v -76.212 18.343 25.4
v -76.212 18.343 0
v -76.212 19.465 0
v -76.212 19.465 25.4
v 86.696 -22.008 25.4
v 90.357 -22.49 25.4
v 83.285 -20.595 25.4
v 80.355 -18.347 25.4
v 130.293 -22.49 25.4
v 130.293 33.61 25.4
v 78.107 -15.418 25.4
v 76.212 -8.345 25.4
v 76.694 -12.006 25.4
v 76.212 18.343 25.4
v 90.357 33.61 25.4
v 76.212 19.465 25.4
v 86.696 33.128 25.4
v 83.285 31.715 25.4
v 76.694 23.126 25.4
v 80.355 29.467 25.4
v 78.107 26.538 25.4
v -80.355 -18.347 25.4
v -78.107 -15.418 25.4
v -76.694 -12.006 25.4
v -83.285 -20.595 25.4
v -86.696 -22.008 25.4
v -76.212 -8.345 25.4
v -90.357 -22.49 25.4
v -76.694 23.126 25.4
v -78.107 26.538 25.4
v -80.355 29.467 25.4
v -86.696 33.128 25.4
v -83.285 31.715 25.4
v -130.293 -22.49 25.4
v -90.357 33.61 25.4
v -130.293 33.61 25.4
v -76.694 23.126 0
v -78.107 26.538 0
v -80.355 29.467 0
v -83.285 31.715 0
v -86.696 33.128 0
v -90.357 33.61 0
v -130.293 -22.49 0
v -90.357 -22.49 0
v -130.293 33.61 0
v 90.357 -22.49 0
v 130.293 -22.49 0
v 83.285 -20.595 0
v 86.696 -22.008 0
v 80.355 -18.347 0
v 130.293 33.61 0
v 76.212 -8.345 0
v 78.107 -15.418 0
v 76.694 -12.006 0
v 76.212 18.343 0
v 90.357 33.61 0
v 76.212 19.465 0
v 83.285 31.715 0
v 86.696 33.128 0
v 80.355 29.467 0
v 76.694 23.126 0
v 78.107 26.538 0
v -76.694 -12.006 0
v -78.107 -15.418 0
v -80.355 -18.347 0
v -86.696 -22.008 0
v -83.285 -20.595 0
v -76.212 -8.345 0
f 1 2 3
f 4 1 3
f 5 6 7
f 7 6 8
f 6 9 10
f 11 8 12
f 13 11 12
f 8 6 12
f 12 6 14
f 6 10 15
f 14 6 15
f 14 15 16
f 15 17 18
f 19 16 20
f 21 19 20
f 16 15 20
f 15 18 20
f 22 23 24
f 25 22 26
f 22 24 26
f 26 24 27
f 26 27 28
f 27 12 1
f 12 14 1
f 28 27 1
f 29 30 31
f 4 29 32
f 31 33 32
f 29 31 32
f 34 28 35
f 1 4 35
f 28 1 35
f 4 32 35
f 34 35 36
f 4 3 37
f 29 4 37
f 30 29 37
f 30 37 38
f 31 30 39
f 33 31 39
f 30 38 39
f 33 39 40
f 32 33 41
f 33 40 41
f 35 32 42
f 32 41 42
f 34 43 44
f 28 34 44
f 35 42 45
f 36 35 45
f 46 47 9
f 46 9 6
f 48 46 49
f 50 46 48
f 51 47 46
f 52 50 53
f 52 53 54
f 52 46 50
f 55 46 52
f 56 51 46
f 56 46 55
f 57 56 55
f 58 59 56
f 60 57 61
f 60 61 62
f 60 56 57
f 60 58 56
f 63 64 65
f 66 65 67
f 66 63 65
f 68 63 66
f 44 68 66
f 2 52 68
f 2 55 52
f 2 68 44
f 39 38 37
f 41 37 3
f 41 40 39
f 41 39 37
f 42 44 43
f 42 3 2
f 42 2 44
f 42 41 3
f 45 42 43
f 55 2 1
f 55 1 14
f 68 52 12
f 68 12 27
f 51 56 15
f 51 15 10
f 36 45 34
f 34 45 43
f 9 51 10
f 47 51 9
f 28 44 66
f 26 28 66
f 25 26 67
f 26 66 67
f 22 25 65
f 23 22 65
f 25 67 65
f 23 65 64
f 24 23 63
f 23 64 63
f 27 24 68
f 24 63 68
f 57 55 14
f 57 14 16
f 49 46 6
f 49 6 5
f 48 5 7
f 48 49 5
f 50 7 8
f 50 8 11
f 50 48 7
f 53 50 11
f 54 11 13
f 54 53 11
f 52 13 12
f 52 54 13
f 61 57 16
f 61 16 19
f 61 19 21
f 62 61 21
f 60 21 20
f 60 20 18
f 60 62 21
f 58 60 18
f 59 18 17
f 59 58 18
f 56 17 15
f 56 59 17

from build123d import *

# Parameters (mm, degrees)
F1_DEPTH = 25.4


with BuildPart() as f1:
    # F0 (on Top) → F1 (new body)
    with BuildSketch(Plane.XY):
        Polygon((-76.211855, 18.343313), (-76.211855, 17.691907), (-76.211855, -8.345137), (0, -8.345137), (0, 8.345137), (0, 18.343313), align=None)
        with BuildLine():
            Line((-76.211855, -8.345137), (-76.211855, 17.691907))
            Line((-76.211855, 17.691907), (-76.211855, 18.343313))
            Line((-76.211855, 18.343313), (-76.211855, 19.464858))
            ThreePointArc((-76.211855, 19.464858), (-80.35492, 29.467103), (-90.357166, 33.610169))
            Line((-90.357166, 33.610169), (-130.292863, 33.610169))
            Line((-130.292863, 33.610169), (-130.292863, -22.490447))
            Line((-130.292863, -22.490447), (-90.357166, -22.490447))
            ThreePointArc((-90.357166, -22.490447), (-80.35492, -18.347382), (-76.211855, -8.345137))
        make_face()
    extrude(amount=F1_DEPTH)

    # F2: F1 across face


with BuildPart() as f1_1:
    add(f1.part)
    add(f1.part.mirror(Plane(origin=(0, 4.999088, 12.7), x_dir=(0, 1, 0), z_dir=(1, 0, 0))))


solid = f1_1.part
